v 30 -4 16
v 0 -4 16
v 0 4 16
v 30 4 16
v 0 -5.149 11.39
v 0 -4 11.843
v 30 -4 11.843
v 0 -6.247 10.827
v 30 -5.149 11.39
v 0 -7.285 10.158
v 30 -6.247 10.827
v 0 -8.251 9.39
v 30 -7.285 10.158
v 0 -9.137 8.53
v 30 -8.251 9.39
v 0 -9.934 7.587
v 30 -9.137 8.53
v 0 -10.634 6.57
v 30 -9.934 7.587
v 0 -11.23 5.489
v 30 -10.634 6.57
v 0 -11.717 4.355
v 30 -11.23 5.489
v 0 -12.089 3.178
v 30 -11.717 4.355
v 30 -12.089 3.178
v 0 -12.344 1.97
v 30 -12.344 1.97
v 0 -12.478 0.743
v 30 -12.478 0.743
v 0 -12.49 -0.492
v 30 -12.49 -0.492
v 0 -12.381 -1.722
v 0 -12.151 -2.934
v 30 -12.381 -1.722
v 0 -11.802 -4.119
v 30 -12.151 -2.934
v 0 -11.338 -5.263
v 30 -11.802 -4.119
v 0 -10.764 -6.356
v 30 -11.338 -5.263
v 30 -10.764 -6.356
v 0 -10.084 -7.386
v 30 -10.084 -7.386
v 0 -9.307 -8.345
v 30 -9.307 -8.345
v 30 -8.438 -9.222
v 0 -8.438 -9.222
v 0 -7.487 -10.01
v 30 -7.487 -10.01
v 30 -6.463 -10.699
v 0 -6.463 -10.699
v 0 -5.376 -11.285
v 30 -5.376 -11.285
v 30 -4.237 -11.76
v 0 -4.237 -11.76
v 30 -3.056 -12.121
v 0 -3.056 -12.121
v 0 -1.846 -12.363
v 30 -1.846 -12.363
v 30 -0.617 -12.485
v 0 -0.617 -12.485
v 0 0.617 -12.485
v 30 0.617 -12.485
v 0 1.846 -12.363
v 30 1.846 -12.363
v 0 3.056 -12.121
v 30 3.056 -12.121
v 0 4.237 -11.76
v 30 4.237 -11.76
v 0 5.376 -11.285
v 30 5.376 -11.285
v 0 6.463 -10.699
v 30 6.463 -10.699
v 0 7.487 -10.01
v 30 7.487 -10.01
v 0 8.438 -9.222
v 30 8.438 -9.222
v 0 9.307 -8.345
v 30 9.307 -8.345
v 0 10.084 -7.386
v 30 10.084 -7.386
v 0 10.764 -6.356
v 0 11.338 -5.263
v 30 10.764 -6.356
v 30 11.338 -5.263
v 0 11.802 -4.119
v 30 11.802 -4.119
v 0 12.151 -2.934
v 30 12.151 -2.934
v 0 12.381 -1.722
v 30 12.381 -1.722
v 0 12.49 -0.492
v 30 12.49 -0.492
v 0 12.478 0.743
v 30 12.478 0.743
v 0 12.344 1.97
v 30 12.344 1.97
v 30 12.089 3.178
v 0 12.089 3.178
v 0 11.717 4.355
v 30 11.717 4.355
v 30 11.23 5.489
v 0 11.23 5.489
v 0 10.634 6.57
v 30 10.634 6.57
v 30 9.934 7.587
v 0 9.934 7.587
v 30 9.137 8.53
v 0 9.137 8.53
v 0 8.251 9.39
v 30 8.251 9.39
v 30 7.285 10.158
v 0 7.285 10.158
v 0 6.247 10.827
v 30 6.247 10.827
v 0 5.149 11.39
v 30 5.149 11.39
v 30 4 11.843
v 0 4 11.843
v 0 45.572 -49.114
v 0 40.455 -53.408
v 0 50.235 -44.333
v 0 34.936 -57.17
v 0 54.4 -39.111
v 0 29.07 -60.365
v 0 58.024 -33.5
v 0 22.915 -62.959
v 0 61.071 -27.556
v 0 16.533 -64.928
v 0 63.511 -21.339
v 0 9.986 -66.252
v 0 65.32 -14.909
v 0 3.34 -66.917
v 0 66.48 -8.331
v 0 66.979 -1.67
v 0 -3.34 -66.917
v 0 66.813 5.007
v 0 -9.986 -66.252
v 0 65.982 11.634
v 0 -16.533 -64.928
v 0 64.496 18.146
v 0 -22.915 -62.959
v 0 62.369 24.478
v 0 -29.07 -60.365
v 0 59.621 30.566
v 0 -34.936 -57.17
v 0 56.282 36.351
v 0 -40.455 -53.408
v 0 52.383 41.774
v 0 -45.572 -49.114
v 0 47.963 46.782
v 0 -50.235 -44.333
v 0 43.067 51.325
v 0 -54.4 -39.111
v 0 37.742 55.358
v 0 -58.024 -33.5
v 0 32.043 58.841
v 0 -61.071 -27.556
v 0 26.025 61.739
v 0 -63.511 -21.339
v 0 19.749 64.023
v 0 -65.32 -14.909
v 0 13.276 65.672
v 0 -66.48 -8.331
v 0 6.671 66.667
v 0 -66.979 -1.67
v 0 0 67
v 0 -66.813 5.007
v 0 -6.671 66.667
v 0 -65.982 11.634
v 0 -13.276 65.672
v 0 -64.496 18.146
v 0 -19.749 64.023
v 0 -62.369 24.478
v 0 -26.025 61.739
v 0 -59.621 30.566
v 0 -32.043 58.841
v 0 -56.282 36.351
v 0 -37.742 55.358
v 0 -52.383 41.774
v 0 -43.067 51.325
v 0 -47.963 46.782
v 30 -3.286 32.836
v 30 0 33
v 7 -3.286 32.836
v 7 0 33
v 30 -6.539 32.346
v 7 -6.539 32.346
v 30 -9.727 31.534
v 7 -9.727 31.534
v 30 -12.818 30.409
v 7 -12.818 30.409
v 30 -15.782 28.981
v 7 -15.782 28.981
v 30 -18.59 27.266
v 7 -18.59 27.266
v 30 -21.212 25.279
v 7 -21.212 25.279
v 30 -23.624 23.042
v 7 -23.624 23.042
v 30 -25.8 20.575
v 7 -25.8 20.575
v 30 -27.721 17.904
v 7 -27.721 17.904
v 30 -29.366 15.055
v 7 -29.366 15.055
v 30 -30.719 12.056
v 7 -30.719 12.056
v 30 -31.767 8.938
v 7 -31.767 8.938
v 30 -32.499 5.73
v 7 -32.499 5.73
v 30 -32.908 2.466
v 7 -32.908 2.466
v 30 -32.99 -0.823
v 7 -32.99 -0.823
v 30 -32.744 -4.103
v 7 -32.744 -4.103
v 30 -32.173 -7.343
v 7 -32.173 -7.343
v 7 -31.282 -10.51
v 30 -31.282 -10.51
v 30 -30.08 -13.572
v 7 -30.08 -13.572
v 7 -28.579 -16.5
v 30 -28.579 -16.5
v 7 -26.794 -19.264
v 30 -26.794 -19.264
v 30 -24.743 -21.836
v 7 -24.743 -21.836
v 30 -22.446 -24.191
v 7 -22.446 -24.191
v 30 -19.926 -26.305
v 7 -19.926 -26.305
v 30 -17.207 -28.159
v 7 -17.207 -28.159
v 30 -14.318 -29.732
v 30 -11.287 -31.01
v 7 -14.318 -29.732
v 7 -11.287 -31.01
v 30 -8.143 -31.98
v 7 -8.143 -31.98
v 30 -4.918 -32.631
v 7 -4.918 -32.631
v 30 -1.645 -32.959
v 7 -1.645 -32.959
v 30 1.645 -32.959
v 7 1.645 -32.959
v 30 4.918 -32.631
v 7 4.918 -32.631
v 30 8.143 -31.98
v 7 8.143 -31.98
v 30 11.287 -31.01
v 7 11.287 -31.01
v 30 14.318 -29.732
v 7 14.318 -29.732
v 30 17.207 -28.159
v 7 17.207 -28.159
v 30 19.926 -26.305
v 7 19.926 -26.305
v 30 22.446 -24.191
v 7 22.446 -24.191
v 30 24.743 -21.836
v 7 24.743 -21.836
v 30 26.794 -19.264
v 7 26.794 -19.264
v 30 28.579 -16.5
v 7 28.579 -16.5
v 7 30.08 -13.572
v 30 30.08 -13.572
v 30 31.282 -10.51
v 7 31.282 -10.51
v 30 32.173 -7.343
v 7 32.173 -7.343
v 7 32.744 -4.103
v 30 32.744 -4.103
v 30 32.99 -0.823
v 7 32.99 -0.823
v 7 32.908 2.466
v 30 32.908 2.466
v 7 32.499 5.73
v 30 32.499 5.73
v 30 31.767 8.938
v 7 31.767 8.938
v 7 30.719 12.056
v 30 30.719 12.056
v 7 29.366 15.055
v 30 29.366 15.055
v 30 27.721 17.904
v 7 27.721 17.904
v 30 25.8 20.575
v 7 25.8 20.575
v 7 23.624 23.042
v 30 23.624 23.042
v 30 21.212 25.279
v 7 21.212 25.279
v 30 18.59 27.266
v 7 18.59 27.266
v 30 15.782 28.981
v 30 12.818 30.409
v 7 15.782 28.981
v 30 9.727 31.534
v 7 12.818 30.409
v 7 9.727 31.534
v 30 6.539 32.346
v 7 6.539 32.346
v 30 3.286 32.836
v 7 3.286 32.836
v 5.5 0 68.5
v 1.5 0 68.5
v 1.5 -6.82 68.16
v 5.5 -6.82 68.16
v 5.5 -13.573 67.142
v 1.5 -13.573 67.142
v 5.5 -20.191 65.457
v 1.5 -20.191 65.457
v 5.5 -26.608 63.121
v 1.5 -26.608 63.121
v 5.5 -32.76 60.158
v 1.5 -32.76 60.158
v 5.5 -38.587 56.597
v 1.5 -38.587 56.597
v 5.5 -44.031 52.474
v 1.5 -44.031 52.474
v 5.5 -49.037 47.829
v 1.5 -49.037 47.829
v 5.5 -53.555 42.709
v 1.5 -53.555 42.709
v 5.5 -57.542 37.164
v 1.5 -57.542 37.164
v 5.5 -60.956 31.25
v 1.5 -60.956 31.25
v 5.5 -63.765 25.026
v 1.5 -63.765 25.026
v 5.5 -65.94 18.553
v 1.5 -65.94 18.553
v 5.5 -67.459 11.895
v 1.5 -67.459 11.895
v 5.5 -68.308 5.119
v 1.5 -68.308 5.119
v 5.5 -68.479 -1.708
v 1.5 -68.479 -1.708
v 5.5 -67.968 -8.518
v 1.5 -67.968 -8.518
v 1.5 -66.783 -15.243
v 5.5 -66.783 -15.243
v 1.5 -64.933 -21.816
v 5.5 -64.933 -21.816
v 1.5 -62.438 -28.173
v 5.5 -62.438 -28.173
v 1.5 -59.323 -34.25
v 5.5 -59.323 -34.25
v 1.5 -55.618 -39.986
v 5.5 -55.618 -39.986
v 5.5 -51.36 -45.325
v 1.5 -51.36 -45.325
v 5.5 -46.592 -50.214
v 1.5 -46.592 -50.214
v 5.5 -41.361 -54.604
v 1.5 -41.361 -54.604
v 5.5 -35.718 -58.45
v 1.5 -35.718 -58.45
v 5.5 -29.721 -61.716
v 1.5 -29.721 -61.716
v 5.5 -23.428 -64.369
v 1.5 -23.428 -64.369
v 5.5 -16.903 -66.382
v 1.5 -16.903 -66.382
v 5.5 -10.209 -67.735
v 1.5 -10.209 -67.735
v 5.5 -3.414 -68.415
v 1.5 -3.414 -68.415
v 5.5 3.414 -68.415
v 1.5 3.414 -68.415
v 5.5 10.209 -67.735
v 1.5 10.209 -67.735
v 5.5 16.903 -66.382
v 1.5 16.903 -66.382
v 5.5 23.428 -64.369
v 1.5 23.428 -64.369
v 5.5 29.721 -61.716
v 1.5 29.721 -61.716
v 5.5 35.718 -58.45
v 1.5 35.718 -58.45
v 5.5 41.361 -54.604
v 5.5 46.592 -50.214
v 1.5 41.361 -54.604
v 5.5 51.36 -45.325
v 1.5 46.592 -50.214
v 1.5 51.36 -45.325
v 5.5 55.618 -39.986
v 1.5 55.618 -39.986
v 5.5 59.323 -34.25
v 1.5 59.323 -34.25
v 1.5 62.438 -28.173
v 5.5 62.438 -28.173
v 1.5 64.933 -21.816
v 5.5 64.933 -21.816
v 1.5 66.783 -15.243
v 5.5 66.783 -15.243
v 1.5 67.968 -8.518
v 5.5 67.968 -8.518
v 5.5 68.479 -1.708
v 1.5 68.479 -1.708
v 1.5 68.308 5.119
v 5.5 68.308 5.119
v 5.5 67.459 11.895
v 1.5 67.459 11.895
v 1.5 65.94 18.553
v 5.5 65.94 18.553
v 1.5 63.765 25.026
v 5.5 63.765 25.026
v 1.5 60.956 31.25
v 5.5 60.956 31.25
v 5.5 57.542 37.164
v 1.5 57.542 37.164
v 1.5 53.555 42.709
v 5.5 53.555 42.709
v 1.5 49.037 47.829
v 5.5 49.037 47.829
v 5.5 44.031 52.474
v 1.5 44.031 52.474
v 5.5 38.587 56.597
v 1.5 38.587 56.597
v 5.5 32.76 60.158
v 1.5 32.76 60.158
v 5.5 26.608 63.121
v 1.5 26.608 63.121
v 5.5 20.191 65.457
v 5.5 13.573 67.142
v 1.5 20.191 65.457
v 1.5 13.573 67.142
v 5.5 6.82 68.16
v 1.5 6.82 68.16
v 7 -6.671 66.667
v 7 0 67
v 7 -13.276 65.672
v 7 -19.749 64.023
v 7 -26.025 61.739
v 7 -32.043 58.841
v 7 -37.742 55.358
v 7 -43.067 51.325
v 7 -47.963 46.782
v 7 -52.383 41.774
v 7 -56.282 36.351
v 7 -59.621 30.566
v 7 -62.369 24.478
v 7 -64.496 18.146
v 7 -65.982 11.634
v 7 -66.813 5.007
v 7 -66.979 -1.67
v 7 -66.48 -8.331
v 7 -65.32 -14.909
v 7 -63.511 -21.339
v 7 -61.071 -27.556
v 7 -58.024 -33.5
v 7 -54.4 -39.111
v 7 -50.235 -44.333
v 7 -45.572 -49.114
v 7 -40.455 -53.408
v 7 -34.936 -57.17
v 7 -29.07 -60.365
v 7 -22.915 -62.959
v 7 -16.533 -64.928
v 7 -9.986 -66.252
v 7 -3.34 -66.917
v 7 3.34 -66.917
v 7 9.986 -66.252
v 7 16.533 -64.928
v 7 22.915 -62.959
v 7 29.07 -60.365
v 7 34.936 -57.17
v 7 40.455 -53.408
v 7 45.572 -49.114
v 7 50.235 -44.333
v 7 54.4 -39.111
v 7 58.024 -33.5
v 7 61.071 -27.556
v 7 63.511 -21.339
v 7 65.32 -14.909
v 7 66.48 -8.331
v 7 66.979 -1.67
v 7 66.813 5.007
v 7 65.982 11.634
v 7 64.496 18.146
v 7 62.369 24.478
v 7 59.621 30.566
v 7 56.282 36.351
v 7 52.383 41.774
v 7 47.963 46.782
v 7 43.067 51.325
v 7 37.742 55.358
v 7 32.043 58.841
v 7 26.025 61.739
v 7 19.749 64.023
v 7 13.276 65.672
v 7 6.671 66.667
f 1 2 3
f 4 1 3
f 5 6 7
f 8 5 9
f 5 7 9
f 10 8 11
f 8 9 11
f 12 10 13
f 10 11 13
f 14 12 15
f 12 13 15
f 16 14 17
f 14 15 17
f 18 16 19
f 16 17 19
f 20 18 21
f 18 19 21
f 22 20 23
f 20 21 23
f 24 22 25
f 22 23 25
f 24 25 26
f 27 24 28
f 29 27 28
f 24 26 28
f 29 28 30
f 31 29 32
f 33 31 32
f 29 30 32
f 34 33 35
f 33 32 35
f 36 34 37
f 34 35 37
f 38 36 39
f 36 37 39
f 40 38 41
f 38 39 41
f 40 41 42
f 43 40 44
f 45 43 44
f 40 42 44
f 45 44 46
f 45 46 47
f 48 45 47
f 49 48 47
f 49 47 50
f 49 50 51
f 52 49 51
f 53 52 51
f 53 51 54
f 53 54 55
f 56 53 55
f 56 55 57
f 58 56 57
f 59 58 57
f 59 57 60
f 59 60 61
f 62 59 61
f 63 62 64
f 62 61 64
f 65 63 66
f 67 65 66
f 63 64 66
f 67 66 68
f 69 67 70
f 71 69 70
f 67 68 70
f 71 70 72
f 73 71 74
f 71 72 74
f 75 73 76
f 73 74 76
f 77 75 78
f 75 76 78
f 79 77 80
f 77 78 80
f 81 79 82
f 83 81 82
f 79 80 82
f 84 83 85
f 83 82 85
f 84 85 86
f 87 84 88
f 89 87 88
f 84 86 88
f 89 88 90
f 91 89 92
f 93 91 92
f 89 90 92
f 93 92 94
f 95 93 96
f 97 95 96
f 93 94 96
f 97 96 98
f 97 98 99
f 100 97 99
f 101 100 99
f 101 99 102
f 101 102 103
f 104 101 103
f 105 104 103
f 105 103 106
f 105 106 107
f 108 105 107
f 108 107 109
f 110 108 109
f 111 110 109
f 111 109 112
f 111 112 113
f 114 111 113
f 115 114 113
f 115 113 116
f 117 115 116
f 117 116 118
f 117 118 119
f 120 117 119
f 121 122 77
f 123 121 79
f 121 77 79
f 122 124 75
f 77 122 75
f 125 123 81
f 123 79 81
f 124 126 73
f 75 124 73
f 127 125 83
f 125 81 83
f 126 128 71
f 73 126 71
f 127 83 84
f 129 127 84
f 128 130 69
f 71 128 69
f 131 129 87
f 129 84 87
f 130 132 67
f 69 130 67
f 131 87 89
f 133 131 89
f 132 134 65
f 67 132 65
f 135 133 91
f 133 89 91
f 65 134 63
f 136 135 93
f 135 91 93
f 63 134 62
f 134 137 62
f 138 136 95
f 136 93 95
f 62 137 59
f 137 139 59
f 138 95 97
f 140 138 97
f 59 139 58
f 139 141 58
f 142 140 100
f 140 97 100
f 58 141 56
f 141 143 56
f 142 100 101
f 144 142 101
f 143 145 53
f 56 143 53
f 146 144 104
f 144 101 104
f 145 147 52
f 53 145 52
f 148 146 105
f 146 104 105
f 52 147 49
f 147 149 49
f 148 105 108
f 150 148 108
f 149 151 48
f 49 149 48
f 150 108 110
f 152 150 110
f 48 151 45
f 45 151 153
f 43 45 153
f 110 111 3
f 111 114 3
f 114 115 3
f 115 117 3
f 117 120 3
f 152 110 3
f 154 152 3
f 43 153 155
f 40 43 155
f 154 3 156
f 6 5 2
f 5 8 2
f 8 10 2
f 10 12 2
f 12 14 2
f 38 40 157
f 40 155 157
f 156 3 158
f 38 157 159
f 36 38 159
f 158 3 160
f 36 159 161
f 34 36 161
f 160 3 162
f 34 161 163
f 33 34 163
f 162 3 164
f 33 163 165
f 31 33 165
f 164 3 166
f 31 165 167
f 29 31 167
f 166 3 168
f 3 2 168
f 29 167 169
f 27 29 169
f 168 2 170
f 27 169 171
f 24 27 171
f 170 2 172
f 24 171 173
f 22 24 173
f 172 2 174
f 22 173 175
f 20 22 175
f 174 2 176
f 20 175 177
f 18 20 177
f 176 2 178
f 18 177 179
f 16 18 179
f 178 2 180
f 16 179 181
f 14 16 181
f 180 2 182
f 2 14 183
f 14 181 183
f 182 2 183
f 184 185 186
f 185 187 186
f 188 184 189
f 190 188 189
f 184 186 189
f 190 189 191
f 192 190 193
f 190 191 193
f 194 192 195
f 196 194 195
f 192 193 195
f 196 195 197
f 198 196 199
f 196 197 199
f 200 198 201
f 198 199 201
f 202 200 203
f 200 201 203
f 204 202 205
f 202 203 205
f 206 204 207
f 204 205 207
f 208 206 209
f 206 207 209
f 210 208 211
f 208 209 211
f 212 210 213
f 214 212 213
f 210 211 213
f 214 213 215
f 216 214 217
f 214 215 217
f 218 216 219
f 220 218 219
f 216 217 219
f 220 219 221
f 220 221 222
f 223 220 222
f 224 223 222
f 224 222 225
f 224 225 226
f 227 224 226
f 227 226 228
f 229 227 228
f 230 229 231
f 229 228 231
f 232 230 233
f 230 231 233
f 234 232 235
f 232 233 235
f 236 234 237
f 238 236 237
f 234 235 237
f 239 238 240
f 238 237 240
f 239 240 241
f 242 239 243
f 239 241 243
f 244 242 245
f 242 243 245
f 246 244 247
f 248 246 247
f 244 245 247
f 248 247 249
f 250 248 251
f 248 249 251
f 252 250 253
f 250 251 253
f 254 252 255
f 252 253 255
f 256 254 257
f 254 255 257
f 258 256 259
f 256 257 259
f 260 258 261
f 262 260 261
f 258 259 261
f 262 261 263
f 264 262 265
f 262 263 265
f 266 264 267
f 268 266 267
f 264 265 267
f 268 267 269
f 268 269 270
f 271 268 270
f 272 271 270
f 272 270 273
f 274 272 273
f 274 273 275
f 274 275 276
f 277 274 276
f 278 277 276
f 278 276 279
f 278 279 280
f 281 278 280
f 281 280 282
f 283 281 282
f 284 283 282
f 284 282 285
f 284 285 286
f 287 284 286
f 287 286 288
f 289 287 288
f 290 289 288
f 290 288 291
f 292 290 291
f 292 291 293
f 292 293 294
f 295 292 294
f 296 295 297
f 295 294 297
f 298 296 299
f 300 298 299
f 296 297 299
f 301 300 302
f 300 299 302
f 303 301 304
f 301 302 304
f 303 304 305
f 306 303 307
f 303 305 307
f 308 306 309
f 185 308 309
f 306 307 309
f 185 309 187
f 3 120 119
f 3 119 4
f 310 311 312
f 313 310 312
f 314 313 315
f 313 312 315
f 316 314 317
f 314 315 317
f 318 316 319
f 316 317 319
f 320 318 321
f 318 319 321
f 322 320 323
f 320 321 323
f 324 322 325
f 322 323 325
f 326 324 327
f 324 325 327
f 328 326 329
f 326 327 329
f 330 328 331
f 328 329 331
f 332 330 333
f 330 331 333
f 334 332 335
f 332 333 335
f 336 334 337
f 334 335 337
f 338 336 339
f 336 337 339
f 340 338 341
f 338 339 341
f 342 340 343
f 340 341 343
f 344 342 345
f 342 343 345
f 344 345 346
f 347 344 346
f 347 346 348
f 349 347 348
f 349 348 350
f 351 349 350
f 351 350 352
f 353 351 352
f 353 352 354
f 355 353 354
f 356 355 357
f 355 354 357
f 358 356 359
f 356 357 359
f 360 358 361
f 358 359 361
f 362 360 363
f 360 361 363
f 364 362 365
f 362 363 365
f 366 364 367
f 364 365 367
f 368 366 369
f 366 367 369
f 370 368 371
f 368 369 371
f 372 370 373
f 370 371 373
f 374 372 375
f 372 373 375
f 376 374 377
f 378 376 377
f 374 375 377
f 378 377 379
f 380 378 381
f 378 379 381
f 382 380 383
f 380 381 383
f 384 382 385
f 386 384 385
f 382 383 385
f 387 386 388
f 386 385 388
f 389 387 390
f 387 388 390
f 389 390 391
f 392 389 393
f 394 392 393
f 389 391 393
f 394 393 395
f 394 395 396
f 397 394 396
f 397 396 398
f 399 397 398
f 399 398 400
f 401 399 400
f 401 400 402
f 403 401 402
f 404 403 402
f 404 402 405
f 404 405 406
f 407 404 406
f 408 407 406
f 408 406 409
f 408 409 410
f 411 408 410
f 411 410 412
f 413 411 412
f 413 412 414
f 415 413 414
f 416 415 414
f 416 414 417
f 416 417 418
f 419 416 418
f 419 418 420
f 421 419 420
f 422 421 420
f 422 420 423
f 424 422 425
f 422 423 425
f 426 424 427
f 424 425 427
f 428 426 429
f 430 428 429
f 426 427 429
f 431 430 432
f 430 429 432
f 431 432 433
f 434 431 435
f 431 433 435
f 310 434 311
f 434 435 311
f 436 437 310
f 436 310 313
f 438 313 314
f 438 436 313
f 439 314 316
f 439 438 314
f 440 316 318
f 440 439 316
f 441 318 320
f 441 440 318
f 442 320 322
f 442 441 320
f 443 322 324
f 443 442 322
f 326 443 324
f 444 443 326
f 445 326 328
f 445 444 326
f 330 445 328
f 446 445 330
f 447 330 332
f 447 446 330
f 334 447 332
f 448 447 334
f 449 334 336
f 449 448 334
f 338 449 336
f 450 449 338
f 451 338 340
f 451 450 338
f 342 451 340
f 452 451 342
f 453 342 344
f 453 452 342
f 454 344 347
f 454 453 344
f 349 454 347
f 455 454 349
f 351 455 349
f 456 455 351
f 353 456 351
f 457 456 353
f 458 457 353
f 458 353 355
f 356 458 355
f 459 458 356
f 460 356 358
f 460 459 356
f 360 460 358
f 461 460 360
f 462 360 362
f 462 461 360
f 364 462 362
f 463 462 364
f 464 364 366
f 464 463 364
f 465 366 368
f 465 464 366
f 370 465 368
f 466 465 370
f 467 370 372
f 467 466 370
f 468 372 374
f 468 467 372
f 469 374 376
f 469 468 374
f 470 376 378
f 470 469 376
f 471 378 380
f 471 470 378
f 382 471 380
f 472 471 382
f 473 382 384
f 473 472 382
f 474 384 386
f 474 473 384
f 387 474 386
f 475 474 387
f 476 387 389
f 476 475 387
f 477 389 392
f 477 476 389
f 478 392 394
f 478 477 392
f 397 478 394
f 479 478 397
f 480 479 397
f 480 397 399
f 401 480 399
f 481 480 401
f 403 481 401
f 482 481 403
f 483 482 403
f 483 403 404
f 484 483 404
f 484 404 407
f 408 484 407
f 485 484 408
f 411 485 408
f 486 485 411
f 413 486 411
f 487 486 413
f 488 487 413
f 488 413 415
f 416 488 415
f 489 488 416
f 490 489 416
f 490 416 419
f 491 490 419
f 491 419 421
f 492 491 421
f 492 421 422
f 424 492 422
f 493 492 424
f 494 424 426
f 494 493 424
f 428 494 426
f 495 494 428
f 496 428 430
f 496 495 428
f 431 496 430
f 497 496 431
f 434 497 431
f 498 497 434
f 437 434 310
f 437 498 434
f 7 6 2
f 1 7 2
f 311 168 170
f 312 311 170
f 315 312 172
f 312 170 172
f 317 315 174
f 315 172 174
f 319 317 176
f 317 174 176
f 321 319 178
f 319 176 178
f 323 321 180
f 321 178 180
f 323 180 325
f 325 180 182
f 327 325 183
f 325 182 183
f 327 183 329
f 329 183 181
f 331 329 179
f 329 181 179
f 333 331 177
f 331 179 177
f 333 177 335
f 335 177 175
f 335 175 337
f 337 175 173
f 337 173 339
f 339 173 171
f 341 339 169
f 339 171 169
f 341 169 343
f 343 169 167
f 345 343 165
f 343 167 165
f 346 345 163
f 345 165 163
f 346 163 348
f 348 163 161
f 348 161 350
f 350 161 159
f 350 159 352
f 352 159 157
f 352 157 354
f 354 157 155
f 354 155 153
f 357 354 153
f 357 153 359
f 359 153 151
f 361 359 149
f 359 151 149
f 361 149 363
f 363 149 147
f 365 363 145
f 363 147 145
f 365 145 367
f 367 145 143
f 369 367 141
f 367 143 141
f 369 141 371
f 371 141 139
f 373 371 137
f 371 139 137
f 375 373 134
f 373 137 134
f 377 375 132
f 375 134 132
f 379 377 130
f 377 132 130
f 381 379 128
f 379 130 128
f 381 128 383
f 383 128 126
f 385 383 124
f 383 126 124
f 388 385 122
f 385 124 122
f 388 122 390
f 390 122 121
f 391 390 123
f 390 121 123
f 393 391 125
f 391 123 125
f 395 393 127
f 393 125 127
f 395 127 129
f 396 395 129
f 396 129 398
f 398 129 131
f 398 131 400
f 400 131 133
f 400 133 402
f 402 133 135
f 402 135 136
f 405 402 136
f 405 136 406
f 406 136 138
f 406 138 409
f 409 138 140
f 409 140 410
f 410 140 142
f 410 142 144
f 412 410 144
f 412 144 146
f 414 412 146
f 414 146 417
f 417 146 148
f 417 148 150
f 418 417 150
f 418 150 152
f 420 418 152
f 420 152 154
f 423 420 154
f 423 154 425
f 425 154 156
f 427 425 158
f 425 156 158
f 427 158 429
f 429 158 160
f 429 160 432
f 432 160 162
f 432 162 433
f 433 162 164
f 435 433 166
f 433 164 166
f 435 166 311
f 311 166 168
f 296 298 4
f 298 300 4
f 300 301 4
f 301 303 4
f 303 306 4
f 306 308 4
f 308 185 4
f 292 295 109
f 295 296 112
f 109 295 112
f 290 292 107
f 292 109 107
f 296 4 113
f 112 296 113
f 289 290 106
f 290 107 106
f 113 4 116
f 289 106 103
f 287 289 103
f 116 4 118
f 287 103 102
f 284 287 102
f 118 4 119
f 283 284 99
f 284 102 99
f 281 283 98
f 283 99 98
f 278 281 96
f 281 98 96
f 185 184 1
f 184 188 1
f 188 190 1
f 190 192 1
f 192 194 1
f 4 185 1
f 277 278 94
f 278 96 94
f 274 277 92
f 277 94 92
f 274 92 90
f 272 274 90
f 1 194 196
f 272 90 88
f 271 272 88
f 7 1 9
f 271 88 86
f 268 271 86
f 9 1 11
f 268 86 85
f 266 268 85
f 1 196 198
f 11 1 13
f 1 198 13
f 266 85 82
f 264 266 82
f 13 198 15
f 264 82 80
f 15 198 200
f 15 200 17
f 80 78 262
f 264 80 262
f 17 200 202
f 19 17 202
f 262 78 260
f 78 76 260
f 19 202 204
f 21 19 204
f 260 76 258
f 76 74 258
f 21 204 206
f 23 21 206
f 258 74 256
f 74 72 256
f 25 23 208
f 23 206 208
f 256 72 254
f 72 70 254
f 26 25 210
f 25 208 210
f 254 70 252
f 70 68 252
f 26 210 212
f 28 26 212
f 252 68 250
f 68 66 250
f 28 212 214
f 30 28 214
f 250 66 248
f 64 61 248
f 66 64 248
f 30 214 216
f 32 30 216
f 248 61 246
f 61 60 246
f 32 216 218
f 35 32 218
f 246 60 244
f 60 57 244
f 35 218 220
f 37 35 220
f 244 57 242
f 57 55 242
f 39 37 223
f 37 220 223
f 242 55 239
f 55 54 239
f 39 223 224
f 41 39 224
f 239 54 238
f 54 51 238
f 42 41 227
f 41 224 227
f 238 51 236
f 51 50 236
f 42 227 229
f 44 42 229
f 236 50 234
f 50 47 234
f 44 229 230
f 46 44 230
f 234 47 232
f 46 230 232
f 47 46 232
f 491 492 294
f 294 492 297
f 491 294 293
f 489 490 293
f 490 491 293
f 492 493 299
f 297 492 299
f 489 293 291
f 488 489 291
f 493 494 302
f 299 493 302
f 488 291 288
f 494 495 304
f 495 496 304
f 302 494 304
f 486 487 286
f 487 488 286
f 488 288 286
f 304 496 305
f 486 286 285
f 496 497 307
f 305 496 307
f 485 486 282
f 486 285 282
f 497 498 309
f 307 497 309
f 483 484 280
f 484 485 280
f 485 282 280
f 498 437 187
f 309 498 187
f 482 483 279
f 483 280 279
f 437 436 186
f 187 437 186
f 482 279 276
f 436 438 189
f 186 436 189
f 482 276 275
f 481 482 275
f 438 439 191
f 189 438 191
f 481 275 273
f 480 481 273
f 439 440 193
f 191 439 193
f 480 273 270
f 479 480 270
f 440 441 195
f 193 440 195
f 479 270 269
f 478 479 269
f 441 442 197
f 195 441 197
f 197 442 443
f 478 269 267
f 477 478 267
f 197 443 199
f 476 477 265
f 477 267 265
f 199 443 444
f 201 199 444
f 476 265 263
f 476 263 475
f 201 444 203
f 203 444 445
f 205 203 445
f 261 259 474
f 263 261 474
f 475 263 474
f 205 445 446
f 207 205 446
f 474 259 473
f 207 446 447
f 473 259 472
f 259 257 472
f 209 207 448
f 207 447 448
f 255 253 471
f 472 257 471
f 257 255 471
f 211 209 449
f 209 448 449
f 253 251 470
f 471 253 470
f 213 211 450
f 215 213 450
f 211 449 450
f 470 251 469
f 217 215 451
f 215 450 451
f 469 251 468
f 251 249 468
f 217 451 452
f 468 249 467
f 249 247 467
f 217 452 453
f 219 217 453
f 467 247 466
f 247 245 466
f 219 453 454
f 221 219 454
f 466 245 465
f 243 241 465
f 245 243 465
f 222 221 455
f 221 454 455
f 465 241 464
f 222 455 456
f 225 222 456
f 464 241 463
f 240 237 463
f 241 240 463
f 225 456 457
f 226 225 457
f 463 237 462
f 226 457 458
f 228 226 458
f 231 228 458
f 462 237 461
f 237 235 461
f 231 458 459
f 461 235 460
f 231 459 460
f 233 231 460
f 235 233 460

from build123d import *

# Parameters (mm, degrees)
F2_W     = 8
F2_H     = 10
F3_DEPTH = 30.001
F4_SIZE  = 1.5


with BuildPart() as f1:
    # F0 (on Front) → F1 (revolve)
    with BuildSketch(Plane.XZ):
        Polygon((7, 68.5), (0, 68.5), (0, 12.5), (30, 12.5), (30, 33), (7, 33), align=None)
    revolve(axis=Axis((33.79849, 0, 0), (1, 0, 0)))

    # F2 (on Right) → F3 (cut, through all)
    with BuildSketch(Plane.YZ):
        with Locations((0, 11)):
            Rectangle(F2_W, F2_H)
    extrude(amount=F3_DEPTH, mode=Mode.SUBTRACT)

    # F4
    f4_edges = [f1.edges().sort_by_distance(p)[0] for p in [
        (7, 0, -68.5),
        (0, 0, -68.5),
    ]]
    chamfer(f4_edges, length=F4_SIZE)


solid = f1.part
